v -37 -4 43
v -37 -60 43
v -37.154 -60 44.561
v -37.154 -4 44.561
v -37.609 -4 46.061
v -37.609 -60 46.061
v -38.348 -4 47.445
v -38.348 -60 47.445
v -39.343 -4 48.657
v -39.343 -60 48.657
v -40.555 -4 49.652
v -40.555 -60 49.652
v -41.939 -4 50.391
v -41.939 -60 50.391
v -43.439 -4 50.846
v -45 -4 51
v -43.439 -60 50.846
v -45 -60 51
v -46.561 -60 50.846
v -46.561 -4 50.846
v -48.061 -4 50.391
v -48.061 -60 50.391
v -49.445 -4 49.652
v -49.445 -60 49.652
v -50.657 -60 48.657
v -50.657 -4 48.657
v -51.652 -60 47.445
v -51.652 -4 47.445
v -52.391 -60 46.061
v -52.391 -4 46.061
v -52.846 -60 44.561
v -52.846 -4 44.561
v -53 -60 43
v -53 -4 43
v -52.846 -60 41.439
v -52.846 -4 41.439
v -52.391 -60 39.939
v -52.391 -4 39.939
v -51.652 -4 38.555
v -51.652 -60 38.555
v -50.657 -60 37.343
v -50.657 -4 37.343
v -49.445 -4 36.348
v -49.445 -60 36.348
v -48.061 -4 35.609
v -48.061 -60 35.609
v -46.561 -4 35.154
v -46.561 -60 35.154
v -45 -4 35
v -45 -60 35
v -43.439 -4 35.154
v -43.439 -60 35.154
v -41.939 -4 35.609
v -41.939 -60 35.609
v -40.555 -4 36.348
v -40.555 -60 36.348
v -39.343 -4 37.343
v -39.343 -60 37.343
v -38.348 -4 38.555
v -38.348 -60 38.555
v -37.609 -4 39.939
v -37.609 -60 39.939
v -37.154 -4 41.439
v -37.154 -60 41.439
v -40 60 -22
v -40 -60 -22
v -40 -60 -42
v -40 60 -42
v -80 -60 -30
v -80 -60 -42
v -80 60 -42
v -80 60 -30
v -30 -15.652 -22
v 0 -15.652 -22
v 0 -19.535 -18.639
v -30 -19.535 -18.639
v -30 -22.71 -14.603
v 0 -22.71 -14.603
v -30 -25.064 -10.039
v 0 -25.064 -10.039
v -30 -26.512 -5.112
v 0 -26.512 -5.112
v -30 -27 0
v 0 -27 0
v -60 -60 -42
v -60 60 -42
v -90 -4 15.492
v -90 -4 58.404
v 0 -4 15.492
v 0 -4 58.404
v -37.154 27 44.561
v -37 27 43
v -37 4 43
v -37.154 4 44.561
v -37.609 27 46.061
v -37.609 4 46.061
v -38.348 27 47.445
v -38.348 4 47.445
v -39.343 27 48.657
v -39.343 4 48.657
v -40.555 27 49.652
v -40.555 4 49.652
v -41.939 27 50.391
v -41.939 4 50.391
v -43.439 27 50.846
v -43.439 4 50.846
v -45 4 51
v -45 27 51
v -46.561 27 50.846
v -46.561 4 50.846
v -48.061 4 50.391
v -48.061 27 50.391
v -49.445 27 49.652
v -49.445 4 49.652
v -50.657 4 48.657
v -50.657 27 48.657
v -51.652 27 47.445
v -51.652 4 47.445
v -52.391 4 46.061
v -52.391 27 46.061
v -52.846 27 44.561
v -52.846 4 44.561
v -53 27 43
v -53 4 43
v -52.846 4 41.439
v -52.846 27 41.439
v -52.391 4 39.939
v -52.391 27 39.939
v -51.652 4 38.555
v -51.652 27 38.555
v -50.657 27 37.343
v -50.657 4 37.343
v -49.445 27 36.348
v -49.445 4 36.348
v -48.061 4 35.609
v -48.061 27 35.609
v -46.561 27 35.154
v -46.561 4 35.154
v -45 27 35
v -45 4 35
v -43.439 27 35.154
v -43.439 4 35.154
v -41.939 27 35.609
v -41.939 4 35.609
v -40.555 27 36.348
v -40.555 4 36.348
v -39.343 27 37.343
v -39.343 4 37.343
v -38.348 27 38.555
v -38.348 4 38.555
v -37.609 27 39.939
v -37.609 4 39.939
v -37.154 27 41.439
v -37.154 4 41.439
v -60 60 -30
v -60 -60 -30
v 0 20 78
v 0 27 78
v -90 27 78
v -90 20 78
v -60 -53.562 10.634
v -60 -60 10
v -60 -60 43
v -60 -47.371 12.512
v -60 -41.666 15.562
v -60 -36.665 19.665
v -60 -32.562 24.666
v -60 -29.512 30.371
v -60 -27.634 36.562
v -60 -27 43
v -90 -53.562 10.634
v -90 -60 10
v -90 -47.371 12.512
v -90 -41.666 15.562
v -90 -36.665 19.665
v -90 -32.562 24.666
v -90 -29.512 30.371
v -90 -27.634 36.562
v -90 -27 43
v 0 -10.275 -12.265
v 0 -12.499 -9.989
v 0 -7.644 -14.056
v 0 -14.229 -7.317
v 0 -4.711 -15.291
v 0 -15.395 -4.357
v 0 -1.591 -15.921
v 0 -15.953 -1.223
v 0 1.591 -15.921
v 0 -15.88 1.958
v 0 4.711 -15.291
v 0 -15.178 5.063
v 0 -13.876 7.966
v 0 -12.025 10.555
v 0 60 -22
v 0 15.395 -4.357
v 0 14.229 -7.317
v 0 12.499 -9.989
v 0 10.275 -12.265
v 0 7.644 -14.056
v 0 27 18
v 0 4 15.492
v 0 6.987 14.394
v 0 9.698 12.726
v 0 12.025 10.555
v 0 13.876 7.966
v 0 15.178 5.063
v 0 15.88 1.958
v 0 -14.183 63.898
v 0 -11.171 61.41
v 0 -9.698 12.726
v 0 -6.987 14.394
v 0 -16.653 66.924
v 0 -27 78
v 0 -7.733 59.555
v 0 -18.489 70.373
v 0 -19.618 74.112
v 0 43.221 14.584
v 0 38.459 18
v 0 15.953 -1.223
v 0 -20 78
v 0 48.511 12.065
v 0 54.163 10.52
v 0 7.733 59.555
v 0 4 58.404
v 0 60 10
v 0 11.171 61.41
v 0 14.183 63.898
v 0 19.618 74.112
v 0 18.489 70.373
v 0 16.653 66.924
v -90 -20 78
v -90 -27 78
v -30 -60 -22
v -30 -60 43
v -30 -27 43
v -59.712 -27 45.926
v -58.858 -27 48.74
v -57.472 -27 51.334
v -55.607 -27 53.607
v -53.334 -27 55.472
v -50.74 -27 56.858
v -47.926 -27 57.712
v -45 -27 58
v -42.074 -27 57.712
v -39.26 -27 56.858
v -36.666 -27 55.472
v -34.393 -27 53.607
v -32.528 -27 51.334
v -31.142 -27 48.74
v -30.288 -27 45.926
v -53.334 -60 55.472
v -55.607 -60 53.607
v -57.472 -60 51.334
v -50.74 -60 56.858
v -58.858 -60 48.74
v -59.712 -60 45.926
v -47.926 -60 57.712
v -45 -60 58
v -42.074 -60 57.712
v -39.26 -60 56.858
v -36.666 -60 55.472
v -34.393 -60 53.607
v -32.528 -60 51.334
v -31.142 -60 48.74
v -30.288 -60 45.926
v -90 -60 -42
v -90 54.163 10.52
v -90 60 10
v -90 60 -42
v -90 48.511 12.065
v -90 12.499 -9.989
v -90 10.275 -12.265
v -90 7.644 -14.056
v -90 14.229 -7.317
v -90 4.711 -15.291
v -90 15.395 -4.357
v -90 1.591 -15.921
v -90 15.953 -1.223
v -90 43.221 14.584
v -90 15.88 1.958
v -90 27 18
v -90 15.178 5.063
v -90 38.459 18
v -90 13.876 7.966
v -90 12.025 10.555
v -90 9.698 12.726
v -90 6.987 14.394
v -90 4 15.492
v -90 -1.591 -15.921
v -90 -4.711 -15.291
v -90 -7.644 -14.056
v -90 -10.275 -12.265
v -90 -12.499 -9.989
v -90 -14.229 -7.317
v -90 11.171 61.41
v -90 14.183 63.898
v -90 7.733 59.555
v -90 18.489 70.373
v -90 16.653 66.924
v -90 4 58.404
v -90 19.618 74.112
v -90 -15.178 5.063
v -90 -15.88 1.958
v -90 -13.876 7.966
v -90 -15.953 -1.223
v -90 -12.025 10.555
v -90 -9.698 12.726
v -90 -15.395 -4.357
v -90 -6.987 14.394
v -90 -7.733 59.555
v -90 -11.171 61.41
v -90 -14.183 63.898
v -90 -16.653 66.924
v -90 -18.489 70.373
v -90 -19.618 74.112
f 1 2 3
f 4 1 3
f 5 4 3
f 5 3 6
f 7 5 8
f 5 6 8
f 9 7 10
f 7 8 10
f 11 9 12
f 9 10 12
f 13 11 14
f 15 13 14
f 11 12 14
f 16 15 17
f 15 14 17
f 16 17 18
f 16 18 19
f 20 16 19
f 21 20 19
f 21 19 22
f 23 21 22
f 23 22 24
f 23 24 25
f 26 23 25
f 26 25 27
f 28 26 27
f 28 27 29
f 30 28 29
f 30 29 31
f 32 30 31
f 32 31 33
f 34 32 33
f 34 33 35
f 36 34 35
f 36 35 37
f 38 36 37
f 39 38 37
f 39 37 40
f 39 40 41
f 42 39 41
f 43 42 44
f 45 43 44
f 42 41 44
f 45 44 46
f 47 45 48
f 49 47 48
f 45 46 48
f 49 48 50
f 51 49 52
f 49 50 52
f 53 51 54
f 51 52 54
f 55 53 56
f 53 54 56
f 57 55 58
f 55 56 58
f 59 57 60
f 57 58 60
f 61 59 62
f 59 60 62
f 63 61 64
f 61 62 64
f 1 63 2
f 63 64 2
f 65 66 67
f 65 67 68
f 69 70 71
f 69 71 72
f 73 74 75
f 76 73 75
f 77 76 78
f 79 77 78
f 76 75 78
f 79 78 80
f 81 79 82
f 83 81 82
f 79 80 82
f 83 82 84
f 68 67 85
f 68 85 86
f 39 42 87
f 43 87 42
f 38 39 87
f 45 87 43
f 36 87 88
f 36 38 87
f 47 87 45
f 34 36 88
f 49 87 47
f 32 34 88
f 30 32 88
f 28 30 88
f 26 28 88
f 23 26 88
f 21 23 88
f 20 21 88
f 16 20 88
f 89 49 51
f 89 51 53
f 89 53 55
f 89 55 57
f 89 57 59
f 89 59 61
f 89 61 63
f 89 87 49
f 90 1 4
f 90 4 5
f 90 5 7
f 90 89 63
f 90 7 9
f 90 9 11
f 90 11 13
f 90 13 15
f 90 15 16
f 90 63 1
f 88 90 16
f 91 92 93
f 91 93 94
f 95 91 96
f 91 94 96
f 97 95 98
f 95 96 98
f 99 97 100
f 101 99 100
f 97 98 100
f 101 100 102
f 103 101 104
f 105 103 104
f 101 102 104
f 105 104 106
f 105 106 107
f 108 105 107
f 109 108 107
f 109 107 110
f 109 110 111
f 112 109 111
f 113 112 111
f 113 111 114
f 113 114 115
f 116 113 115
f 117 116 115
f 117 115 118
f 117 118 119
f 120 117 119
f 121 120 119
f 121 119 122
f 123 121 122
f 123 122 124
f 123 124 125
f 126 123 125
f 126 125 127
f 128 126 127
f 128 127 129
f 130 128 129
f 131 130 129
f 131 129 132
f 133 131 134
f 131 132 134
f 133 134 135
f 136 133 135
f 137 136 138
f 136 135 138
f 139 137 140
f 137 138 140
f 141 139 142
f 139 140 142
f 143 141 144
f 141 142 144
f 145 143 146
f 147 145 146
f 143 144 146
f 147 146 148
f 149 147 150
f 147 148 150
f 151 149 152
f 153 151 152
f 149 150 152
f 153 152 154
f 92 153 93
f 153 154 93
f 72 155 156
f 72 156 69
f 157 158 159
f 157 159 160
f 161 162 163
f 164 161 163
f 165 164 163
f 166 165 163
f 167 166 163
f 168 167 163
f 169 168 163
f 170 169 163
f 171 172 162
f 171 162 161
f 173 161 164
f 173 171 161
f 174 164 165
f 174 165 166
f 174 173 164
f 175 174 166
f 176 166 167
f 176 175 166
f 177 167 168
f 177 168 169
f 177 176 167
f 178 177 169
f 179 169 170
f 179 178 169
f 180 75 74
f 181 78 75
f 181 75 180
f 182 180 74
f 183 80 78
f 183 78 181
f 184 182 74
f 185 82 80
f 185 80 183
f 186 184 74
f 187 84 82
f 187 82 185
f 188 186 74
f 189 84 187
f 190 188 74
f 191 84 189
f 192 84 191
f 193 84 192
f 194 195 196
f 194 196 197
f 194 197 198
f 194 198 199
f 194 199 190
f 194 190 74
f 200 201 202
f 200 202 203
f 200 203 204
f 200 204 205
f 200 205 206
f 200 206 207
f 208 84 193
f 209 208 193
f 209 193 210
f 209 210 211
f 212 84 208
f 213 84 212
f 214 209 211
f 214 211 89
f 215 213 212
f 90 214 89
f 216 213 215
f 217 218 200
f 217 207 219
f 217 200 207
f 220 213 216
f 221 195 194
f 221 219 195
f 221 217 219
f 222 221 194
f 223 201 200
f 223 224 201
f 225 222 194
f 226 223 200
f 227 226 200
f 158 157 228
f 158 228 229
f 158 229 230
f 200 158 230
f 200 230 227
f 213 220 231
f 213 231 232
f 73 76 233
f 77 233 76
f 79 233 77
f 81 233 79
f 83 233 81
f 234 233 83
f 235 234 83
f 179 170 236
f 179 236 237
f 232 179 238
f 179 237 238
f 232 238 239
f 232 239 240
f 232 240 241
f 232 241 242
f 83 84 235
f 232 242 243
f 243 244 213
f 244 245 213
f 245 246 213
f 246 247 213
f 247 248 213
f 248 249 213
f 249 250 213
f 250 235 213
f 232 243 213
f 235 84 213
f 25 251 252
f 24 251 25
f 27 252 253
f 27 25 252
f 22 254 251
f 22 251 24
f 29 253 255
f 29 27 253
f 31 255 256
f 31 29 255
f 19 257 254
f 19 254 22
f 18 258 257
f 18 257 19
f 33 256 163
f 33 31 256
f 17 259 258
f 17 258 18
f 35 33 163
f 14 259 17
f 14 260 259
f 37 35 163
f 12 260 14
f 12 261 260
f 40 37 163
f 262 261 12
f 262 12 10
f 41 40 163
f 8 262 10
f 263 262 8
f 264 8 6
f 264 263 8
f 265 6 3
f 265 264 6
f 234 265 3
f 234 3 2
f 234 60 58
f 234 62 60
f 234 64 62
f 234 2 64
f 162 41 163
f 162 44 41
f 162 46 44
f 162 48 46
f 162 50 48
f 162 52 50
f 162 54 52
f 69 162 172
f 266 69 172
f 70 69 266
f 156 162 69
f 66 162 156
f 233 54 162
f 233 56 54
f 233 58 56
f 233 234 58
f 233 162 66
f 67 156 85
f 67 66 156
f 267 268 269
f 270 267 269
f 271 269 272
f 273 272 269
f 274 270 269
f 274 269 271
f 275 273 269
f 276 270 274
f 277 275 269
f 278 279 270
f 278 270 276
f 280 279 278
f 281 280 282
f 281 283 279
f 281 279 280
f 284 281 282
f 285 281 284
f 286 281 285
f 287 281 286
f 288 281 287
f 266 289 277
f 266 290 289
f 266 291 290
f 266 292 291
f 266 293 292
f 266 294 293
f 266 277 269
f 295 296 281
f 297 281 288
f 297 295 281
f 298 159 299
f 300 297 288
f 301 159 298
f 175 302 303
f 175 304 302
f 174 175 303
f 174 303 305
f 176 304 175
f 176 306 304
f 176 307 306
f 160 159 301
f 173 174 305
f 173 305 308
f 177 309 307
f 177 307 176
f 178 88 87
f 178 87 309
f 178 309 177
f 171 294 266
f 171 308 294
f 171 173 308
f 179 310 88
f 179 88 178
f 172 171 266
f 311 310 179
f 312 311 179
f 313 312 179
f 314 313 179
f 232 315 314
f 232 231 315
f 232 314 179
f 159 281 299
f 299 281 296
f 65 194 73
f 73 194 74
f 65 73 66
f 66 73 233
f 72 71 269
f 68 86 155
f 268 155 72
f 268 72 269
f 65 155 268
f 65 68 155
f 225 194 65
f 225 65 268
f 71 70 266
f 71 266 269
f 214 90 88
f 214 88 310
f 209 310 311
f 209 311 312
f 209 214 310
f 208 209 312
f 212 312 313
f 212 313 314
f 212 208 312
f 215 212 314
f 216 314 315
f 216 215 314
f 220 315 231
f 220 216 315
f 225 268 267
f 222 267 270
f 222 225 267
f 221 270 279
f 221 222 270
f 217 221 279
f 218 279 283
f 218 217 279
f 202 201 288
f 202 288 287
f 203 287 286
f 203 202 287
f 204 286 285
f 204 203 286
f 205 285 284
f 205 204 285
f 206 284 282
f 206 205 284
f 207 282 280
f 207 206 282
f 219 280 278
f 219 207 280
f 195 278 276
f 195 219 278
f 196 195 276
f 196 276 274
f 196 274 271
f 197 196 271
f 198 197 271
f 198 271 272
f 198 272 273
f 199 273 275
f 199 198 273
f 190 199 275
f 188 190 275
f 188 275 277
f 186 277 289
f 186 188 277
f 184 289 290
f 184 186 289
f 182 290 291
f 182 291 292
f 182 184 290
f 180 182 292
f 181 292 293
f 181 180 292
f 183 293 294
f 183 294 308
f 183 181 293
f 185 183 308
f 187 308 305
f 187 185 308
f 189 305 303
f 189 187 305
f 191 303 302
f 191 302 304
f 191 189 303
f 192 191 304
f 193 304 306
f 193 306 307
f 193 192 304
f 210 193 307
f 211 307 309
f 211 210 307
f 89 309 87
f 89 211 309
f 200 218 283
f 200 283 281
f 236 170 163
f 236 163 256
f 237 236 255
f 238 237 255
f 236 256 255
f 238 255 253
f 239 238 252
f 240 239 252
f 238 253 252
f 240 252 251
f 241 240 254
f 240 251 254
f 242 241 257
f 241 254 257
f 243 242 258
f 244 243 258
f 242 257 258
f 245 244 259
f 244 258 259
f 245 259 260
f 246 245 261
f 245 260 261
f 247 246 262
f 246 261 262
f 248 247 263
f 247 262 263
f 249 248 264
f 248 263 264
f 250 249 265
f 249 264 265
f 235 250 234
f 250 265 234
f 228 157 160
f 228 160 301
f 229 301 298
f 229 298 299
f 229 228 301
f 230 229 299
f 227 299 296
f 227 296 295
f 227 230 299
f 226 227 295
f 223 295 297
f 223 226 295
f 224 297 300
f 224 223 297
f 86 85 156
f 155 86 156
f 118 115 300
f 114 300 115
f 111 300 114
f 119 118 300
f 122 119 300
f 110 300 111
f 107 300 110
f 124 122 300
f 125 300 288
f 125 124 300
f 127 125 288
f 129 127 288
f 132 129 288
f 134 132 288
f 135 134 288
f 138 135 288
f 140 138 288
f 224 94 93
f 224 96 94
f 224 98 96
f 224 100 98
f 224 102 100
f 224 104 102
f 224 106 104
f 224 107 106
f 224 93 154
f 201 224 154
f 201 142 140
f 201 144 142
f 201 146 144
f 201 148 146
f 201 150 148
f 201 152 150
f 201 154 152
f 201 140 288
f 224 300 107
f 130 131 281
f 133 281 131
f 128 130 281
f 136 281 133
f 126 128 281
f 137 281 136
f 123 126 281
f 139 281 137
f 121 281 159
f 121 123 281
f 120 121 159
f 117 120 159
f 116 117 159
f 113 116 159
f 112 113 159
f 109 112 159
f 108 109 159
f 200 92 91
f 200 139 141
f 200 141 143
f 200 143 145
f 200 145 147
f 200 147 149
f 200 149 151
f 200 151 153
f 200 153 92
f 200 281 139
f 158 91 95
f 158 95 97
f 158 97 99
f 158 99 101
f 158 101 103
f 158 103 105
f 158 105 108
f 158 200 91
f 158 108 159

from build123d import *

# Parameters (mm, degrees)
F3_DEPTH  = 90
F4_DEPTH  = 40
F5_DEPTH  = 30
F6_W      = 20
F6_H      = 12
F7_DEPTH  = 120.001
F9_DEPTH  = 33
F8_R      = 8
F10_DEPTH = 120.001
F12_DEPTH = 30


with BuildPart() as f3:
    # F2 (on Right) → F3 (new body)
    with BuildSketch(Plane.YZ):
        Polygon((-60, -22), (-60, -42), (60, -42), (60, -22), (-15.6524758425, -22), align=None)
        with BuildLine():
            Line((-60, 78), (-60, -22))
            Line((-60, -22), (-15.6524758425, -22))
            ThreePointArc((-15.6524758425, -22), (-23.9960084988, -12.3770584602), (-27, 0))
            Line((-27, 0), (-27, 78))
            Line((-27, 78), (-60, 78))
        make_face()
        with BuildLine():
            Line((-15.6524758425, -22), (60, -22))
            Line((60, -22), (60, 10))
            ThreePointArc((60, 10), (48.5108747069, 12.0645834035), (38.4593407715, 18))
            Line((38.4593407715, 18), (27, 18))
            Line((27, 18), (27, 78))
            Line((27, 78), (20, 78))
            ThreePointArc((20, 78), (15.4919333848, 65.3508893593), (4, 58.4040820577))
            Line((4, 58.4040820577), (4, 15.4919333848))
            ThreePointArc((4, 15.4919333848), (0, -16), (-4, 15.4919333848))
            Line((-4, 15.4919333848), (-4, 58.4040820577))
            ThreePointArc((-4, 58.4040820577), (-15.4919333848, 65.3508893593), (-20, 78))
            Line((-20, 78), (-27, 78))
            Line((-27, 78), (-27, 0))
            ThreePointArc((-27, 0), (-23.9960084988, -12.3770584602), (-15.6524758425, -22))
        make_face()
    extrude(amount=-F3_DEPTH)

    # F2 (on Right) → F4 (cut)
    with BuildSketch(Plane.YZ):
        Polygon((-60, -22), (-60, -42), (60, -42), (60, -22), (-15.6524758425, -22), align=None)
    extrude(amount=-F4_DEPTH, mode=Mode.SUBTRACT)

    # F2 (on Right) → F5 (cut)
    with BuildSketch(Plane.YZ):
        with BuildLine():
            Line((-60, 78), (-60, -22))
            Line((-60, -22), (-15.6524758425, -22))
            ThreePointArc((-15.6524758425, -22), (-23.9960084988, -12.3770584602), (-27, 0))
            Line((-27, 0), (-27, 78))
            Line((-27, 78), (-60, 78))
        make_face()
    extrude(amount=-F5_DEPTH, mode=Mode.SUBTRACT)

    # F6 (on face) → F7 (cut, through all)
    with BuildSketch(Plane(origin=(0, 60, 0), x_dir=(-1, 0, 0), z_dir=(0, 1, 0))):
        with Locations((70, -36)):
            Rectangle(F6_W, F6_H)
    extrude(amount=-F7_DEPTH, mode=Mode.SUBTRACT)

    # F8 (on face) → F9 (cut)
    with BuildSketch(Plane.XZ.offset(60)):
        with BuildLine():
            ThreePointArc((-60, 43), (-45, 58), (-30, 43))
            Line((-30, 43), (-30, 78))
            Line((-30, 78), (-90, 78))
            Line((-90, 78), (-90, 10))
            Line((-90, 10), (-60, 10))
            Line((-60, 10), (-60, 43))
        make_face()
    extrude(amount=-F9_DEPTH, mode=Mode.SUBTRACT)

    # F8 (on face) → F10 (cut, through all)
    with BuildSketch(Plane.XZ.offset(60)):
        with Locations((-45, 43)):
            Circle(F8_R)
    extrude(amount=-F10_DEPTH, mode=Mode.SUBTRACT)

    # F11 (on face) → F12 (join, through all)
    with BuildSketch(Plane(origin=(-90, 0, 0), x_dir=(0, -1, 0), z_dir=(-1, 0, 0))):
        with BuildLine():
            ThreePointArc((60, 10), (36.6654762208, 19.6654762208), (27, 43))
            Line((27, 43), (27, 10))
            Line((27, 10), (60, 10))
        make_face()
    extrude(amount=-F12_DEPTH)


solid = f3.part
